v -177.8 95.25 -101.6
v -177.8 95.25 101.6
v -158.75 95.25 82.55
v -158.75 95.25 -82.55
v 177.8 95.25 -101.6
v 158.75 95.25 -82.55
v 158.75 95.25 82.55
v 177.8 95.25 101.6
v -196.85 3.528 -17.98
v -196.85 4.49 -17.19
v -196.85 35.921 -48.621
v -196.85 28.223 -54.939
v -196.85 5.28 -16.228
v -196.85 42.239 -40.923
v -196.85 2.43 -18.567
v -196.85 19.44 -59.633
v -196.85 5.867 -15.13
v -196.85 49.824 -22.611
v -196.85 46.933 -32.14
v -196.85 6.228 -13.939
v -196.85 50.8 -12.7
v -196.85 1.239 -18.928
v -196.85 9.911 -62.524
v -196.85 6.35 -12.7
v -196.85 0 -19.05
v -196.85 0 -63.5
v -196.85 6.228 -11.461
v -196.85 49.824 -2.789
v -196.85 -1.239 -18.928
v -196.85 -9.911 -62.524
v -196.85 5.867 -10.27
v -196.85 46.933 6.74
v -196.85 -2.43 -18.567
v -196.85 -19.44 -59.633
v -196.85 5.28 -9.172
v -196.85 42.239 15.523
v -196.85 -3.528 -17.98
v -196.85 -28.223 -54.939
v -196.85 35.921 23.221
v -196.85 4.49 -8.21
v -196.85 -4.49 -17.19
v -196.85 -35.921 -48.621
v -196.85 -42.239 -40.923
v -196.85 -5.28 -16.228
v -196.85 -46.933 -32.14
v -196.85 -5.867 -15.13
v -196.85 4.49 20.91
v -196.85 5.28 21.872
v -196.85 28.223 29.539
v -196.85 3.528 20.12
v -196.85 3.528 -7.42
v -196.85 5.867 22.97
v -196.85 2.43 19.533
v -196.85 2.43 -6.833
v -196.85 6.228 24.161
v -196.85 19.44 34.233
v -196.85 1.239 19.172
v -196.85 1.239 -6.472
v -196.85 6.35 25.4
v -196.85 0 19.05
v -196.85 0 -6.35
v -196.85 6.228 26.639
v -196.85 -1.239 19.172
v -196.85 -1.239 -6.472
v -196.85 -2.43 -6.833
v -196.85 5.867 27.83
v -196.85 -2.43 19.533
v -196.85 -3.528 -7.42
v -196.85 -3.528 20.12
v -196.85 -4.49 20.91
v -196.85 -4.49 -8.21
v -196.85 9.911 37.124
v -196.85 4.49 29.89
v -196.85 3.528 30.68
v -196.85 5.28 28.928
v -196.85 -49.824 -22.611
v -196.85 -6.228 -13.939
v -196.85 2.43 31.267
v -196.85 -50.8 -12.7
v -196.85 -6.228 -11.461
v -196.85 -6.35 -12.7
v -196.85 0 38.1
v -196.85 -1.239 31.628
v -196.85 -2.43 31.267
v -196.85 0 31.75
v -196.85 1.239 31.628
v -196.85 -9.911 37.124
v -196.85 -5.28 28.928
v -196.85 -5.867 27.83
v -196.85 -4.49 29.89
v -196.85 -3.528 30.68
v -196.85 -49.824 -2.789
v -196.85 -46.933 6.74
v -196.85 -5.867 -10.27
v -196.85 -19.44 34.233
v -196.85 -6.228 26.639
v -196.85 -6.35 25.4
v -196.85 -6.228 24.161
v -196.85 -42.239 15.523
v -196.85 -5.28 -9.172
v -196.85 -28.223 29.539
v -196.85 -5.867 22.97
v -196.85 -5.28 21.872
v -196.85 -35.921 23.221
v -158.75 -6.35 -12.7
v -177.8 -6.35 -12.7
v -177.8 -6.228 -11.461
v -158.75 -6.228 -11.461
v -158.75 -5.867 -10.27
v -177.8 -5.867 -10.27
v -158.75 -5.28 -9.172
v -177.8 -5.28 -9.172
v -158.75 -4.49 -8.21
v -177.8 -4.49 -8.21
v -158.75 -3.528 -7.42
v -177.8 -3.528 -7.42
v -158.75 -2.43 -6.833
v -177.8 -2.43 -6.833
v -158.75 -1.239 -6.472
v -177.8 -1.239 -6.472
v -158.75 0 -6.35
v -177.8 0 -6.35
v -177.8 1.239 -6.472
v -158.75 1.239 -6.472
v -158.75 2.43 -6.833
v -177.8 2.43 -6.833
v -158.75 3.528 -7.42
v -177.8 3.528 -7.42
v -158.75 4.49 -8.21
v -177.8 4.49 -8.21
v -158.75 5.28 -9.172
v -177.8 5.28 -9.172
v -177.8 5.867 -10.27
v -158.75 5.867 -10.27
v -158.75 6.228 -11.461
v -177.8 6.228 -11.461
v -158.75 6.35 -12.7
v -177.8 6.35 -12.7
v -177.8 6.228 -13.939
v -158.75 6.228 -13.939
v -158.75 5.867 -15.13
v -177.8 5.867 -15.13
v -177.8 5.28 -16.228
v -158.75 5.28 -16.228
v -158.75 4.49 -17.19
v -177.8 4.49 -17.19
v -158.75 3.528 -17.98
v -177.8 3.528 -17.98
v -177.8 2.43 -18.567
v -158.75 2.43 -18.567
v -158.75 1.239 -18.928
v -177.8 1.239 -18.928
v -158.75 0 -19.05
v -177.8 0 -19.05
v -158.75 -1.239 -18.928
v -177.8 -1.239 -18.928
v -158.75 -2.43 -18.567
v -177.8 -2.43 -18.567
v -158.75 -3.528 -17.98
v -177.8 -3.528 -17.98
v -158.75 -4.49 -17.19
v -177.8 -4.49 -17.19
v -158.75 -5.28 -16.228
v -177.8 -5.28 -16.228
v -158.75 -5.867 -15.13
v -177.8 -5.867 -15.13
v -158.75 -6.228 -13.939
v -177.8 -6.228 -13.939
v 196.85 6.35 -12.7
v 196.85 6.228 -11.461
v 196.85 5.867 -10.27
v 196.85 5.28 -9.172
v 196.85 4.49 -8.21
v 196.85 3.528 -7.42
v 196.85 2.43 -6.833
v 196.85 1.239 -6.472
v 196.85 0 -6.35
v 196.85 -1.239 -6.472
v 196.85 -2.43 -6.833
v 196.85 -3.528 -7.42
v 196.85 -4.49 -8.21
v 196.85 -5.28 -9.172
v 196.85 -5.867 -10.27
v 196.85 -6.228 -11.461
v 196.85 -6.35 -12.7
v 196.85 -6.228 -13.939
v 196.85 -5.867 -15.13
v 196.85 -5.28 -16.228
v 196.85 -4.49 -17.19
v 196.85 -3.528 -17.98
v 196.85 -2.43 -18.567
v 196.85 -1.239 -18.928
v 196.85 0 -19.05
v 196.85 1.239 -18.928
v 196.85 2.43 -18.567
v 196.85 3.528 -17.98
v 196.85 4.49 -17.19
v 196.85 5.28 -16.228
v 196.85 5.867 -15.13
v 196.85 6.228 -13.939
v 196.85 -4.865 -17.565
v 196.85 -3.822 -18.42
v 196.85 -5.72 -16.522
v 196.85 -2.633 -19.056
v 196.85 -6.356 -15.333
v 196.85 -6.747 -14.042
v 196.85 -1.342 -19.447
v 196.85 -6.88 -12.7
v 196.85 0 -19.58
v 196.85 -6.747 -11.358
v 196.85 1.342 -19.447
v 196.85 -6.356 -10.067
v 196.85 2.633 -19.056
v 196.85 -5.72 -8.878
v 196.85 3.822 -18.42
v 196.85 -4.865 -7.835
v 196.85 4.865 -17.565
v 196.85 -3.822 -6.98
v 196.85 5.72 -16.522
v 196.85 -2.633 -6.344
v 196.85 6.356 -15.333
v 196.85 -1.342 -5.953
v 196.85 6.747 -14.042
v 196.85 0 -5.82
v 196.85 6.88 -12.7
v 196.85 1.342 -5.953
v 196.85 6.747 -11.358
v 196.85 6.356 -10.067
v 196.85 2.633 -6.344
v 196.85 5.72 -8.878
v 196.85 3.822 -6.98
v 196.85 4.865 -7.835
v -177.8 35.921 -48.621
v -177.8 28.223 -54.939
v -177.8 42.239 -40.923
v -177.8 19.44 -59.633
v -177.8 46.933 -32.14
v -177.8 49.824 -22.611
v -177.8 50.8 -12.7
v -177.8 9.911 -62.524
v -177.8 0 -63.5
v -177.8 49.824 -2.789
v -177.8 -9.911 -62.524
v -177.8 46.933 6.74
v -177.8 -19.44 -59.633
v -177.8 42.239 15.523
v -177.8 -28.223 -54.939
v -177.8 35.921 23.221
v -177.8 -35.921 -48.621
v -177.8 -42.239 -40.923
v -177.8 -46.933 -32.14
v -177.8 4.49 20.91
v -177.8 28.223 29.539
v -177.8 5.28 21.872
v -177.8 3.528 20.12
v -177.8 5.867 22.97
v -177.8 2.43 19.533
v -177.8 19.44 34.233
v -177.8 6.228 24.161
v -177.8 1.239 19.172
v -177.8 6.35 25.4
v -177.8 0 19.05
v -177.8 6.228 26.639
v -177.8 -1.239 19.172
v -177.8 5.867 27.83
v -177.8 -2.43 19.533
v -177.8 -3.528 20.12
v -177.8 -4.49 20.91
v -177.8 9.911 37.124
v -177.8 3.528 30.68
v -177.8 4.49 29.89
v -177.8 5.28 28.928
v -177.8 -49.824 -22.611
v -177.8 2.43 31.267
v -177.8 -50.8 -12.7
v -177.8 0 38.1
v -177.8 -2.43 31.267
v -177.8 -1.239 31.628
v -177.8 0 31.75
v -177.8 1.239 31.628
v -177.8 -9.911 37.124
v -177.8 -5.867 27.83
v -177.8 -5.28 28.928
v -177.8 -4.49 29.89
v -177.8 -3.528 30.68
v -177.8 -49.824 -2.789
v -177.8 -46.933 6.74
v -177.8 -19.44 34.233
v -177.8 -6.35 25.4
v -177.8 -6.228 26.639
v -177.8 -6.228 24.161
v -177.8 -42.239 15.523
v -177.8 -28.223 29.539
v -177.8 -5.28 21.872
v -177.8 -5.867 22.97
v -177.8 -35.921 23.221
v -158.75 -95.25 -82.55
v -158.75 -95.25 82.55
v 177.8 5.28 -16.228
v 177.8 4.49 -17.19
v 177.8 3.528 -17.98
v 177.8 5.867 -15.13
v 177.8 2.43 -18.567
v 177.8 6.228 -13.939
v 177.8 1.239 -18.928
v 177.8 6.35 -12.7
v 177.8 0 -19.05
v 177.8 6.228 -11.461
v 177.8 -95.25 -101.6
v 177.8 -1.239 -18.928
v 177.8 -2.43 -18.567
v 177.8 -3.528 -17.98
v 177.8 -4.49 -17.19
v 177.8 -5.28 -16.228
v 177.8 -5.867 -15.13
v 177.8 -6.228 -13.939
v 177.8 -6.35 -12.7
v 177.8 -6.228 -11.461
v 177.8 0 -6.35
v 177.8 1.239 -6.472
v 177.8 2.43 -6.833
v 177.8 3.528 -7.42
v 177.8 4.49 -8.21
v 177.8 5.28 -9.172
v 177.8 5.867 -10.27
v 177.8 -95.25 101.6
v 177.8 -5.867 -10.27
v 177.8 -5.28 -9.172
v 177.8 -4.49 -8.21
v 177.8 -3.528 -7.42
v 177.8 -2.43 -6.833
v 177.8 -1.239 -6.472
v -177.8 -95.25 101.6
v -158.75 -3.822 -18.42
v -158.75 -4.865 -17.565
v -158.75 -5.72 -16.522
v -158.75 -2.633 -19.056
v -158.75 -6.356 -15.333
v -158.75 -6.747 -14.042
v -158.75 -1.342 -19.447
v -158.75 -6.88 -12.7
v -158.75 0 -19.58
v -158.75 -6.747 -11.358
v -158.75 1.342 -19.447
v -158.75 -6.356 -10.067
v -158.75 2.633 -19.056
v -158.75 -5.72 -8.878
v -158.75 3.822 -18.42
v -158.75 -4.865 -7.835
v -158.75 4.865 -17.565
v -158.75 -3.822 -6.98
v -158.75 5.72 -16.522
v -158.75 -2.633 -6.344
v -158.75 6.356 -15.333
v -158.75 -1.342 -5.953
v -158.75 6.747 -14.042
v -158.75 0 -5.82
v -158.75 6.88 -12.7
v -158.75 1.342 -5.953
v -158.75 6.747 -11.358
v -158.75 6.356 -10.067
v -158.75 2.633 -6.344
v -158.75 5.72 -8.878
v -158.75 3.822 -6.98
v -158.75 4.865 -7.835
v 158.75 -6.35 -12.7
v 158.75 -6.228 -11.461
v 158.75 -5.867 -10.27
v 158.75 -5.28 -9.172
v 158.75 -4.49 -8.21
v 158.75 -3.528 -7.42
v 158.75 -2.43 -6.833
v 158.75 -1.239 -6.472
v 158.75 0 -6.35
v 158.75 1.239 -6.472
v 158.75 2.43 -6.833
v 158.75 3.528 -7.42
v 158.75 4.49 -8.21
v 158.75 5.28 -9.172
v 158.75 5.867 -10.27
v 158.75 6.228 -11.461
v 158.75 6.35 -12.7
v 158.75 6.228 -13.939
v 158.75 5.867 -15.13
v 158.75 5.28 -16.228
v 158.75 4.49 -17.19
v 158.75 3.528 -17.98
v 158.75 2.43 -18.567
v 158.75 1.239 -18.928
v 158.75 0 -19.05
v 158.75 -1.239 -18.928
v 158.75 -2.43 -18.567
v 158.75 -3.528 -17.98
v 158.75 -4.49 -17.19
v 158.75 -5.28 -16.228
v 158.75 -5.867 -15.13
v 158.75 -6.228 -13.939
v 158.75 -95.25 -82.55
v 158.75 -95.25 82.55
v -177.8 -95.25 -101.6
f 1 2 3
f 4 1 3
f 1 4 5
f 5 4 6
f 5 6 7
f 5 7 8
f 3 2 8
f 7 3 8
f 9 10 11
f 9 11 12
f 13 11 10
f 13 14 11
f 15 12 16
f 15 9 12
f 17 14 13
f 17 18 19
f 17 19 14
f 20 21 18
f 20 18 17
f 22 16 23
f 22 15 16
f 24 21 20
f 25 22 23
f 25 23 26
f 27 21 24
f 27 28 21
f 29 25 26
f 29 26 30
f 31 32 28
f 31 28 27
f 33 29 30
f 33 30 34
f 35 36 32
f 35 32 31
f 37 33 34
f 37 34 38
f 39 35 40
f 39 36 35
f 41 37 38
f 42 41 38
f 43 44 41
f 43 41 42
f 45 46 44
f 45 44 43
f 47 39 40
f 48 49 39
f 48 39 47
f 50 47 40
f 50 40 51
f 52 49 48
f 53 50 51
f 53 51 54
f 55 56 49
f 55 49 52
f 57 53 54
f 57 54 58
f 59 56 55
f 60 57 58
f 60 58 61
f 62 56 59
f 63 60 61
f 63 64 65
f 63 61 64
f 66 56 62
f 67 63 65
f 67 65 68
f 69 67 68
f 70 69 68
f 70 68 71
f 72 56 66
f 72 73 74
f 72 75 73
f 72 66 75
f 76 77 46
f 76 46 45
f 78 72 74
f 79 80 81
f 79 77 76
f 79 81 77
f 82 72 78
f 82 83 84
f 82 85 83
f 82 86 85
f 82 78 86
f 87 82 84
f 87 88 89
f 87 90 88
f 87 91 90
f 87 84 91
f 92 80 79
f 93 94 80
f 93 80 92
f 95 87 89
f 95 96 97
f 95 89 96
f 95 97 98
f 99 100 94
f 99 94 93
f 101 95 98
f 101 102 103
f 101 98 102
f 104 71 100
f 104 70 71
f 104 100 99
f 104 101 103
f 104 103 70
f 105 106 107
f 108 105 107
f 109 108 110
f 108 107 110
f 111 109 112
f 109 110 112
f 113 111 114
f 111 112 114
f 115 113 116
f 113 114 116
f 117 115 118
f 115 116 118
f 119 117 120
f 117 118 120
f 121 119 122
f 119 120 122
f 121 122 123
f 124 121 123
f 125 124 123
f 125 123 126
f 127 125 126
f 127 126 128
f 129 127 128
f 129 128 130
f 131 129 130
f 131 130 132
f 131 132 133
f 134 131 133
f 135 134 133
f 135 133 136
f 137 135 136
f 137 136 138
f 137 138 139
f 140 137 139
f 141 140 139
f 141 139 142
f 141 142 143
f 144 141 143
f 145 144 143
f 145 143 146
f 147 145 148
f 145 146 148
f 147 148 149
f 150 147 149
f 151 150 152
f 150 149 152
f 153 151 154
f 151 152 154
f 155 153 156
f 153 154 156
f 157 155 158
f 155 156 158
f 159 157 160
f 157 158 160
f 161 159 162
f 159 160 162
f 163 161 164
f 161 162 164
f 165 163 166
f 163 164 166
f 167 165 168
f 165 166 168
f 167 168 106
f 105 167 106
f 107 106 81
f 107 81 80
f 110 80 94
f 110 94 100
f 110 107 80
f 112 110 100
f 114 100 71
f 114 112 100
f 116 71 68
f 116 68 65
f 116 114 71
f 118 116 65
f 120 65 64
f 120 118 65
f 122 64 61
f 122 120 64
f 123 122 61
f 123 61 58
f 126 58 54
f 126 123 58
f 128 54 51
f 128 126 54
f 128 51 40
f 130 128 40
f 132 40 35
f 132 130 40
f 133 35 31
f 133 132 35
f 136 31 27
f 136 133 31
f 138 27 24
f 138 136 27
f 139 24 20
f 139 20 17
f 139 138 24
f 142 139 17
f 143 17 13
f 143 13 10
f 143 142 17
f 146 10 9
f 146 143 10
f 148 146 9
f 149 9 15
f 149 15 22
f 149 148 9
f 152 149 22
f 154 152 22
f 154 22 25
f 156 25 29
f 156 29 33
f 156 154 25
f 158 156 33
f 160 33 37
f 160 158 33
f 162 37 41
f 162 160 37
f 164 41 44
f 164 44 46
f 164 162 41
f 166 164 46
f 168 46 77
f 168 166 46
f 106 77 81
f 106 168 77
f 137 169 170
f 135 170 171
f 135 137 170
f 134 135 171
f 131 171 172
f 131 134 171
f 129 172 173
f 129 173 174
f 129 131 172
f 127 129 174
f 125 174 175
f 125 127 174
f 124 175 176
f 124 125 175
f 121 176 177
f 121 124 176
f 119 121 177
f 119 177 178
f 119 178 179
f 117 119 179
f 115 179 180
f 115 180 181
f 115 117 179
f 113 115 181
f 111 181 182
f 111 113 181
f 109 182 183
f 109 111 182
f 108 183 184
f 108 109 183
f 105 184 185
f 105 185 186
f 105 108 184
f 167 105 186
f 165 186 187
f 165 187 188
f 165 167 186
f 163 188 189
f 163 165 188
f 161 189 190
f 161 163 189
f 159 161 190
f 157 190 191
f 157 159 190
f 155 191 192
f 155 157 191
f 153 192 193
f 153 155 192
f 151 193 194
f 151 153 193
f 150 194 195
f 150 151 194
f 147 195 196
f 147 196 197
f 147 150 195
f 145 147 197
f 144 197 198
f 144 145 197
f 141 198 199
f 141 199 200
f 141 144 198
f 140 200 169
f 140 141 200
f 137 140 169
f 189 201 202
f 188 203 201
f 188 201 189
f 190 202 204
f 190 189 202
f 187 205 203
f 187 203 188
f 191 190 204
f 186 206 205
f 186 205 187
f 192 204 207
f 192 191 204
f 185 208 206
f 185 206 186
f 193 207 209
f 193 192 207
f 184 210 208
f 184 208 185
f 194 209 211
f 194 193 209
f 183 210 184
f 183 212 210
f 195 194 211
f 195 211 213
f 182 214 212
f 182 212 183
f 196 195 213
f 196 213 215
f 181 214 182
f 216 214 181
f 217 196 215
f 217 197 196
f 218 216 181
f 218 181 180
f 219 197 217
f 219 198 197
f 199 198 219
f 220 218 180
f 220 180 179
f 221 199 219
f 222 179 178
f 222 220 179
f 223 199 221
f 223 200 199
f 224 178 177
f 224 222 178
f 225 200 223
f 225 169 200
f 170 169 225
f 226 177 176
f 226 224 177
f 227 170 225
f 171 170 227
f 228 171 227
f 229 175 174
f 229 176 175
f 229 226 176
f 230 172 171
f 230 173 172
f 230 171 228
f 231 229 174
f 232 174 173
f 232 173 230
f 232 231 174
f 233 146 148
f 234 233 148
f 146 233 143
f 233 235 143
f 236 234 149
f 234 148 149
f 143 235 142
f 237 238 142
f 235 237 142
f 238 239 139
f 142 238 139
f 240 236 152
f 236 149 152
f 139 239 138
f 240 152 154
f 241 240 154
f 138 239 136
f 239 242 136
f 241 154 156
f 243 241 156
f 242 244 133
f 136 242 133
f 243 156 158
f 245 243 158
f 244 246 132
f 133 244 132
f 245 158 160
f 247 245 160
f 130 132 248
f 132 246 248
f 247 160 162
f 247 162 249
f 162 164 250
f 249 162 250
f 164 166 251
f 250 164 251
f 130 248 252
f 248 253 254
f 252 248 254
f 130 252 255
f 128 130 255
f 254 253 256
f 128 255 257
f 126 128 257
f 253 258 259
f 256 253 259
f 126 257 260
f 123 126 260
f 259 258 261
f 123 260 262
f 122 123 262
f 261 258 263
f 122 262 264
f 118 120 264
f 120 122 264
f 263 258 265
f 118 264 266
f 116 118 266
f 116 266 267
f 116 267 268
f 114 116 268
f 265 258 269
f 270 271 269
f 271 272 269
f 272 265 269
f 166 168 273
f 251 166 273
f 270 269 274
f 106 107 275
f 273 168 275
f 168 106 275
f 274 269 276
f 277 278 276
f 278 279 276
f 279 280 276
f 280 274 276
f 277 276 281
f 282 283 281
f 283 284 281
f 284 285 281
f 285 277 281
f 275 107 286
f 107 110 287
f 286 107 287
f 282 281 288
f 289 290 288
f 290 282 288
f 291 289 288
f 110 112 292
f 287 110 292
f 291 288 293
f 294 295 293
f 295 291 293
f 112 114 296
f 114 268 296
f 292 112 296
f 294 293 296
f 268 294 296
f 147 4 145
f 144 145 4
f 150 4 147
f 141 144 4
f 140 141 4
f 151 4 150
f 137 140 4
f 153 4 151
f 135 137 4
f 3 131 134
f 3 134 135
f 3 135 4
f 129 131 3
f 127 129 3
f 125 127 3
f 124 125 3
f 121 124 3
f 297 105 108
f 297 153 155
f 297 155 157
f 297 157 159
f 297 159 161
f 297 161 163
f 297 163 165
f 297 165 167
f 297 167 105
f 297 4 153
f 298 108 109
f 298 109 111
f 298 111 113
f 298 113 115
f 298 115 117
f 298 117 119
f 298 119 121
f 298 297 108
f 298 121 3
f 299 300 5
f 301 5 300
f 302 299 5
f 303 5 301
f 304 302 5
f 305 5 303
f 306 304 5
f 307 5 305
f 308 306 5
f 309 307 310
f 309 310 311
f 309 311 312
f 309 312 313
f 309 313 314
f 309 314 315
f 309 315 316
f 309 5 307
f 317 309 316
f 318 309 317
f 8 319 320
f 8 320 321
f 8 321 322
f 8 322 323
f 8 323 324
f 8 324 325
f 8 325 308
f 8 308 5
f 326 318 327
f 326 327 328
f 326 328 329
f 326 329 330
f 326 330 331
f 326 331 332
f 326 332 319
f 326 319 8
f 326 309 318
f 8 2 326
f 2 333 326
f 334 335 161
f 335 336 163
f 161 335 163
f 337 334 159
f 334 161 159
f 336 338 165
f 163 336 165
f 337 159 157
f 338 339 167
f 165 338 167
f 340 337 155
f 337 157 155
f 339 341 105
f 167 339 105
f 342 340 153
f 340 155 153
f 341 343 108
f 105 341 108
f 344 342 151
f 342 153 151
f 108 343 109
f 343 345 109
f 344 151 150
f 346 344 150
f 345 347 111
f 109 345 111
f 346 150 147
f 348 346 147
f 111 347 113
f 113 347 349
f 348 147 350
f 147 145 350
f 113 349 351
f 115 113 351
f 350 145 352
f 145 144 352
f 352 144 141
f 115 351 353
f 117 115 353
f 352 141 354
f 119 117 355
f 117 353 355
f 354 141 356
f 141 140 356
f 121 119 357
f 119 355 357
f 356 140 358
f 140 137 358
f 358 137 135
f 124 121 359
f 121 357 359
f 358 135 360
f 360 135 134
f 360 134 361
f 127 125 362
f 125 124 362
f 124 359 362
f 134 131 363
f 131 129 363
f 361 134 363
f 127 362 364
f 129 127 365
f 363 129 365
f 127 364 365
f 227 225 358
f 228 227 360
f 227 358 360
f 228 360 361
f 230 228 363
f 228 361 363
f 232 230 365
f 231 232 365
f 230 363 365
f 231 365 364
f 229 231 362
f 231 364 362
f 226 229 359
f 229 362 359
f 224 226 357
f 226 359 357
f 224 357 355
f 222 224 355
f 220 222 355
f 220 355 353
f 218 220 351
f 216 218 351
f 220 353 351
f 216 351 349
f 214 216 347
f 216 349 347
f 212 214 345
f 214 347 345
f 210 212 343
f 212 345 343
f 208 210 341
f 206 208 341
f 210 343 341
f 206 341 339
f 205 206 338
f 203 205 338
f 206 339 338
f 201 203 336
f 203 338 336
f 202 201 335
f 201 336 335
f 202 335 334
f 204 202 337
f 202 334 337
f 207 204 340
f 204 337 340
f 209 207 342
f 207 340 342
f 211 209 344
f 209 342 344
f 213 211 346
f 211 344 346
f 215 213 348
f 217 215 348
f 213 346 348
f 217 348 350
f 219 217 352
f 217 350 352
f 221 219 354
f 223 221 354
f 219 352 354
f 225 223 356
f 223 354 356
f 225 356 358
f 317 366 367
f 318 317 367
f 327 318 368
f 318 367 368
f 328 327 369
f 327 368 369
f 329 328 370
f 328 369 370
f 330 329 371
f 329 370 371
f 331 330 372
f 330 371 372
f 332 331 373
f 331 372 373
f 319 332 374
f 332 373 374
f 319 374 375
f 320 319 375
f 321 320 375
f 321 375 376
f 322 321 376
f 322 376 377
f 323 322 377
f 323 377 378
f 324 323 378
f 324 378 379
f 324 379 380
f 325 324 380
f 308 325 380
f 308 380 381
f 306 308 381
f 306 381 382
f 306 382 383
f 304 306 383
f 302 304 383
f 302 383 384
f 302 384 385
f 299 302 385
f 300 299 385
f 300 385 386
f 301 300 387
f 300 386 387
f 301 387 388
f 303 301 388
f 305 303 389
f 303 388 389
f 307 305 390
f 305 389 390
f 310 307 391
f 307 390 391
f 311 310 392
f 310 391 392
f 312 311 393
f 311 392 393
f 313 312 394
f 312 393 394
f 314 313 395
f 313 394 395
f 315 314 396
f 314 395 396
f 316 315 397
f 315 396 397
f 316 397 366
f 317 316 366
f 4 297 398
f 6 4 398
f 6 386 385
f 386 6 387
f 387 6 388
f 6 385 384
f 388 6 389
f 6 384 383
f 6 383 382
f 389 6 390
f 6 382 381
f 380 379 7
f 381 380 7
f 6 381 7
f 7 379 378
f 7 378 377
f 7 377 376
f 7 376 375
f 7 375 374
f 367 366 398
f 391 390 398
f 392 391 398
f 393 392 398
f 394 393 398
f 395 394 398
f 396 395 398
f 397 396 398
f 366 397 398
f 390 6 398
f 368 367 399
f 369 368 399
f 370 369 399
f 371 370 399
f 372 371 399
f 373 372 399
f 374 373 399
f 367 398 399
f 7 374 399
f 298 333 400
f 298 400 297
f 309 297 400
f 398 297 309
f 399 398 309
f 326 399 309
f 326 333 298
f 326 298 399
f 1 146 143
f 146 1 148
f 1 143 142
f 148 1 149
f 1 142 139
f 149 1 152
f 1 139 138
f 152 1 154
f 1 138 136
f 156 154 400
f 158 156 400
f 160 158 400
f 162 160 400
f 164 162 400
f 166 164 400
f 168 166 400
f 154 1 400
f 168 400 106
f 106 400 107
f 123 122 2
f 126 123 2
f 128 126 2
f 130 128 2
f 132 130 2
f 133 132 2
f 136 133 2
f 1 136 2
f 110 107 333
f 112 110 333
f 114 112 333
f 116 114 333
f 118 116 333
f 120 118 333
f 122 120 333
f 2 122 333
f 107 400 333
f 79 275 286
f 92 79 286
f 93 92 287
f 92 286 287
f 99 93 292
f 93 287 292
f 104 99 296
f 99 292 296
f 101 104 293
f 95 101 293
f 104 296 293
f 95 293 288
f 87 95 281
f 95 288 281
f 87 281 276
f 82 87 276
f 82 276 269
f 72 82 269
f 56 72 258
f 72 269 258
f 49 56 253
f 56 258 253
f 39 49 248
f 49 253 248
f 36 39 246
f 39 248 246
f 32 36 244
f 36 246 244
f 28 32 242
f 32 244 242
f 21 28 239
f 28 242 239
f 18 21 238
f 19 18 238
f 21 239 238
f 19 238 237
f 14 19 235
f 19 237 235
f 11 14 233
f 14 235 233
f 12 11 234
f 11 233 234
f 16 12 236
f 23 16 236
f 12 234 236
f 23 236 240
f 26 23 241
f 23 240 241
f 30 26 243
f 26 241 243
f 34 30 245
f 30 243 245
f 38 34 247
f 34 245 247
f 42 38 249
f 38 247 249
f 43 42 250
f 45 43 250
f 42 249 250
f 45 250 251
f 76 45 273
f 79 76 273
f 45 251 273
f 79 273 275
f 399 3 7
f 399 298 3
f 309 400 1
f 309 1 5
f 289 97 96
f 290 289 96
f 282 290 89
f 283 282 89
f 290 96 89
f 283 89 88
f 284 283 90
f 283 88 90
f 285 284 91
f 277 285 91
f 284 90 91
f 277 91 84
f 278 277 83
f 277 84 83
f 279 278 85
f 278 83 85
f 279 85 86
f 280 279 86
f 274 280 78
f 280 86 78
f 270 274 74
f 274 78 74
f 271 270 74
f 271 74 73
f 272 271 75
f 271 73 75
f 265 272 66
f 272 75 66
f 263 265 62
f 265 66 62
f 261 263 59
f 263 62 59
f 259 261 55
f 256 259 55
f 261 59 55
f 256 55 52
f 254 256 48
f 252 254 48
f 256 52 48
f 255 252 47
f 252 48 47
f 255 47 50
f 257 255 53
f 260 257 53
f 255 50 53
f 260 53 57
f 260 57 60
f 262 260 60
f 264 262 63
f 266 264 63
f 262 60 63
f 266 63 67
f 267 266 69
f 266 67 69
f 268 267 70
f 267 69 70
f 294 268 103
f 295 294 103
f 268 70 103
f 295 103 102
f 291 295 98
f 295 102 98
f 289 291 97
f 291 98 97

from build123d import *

# Parameters (mm, degrees)
F0_W      = 355.6
F0_H      = 203.2
F0_W_2    = 317.5
F0_H_2    = 165.1
F1_DEPTH  = 95.25
F2_R      = 6.35
F3_DEPTH  = 355.601
F4_R      = 50.8
F4_R_2    = 6.35
F5_DEPTH  = 19.05
F6_R      = 6.35
F7_DEPTH  = 19.05
F9_R      = 6.879532365
F9_R_2    = 6.35
F10_DEPTH = 355.6


# Not quite as in the source:
# - the program builds the solid bodies; features that only make, move or delete a surface that nothing else refers to are left out


with BuildPart() as f1:
    # F0 (on Front) → F1 (new body, symmetric)
    with BuildSketch(Plane.XZ):
        Rectangle(F0_W, F0_H)
        Rectangle(F0_W_2, F0_H_2, mode=Mode.SUBTRACT)
    extrude(amount=F1_DEPTH, both=True)

    # F2 (on face) → F3 (cut, through all)
    with BuildSketch(Plane(origin=(-177.8, 0, 0), x_dir=(0, -1, 0), z_dir=(-1, 0, 0))):
        with Locations((0, -12.7)):
            Circle(F2_R)
    extrude(amount=-F3_DEPTH, mode=Mode.SUBTRACT)


with BuildPart() as f5:
    # F4 (on face) → F5 (new body)
    with BuildSketch(Plane(origin=(-177.8, 0, 0), x_dir=(0, -1, 0), z_dir=(-1, 0, 0))):
        with Locations((0, -12.7)):
            Circle(F4_R)
        with Locations((0, -12.7)):
            Circle(F4_R_2, mode=Mode.SUBTRACT)
    extrude(amount=F5_DEPTH)

    # F6 (on face) → F7 (cut, through all)
    with BuildSketch(Plane(origin=(-196.85, 0, 0), x_dir=(0, -1, 0), z_dir=(-1, 0, 0))):
        with Locations((0, 25.4)):
            Circle(F6_R)
    extrude(amount=-F7_DEPTH, mode=Mode.SUBTRACT)


with BuildPart() as f10:
    # F9 (on face) → F10 (new body)
    with BuildSketch(Plane.YZ.offset(-158.75)):
        with Locations((0, -12.7)):
            Circle(F9_R)
        with Locations((0, -12.7)):
            Circle(F9_R_2, mode=Mode.SUBTRACT)
    extrude(amount=F10_DEPTH)


solid = Compound([f1.part, f5.part, f10.part])
